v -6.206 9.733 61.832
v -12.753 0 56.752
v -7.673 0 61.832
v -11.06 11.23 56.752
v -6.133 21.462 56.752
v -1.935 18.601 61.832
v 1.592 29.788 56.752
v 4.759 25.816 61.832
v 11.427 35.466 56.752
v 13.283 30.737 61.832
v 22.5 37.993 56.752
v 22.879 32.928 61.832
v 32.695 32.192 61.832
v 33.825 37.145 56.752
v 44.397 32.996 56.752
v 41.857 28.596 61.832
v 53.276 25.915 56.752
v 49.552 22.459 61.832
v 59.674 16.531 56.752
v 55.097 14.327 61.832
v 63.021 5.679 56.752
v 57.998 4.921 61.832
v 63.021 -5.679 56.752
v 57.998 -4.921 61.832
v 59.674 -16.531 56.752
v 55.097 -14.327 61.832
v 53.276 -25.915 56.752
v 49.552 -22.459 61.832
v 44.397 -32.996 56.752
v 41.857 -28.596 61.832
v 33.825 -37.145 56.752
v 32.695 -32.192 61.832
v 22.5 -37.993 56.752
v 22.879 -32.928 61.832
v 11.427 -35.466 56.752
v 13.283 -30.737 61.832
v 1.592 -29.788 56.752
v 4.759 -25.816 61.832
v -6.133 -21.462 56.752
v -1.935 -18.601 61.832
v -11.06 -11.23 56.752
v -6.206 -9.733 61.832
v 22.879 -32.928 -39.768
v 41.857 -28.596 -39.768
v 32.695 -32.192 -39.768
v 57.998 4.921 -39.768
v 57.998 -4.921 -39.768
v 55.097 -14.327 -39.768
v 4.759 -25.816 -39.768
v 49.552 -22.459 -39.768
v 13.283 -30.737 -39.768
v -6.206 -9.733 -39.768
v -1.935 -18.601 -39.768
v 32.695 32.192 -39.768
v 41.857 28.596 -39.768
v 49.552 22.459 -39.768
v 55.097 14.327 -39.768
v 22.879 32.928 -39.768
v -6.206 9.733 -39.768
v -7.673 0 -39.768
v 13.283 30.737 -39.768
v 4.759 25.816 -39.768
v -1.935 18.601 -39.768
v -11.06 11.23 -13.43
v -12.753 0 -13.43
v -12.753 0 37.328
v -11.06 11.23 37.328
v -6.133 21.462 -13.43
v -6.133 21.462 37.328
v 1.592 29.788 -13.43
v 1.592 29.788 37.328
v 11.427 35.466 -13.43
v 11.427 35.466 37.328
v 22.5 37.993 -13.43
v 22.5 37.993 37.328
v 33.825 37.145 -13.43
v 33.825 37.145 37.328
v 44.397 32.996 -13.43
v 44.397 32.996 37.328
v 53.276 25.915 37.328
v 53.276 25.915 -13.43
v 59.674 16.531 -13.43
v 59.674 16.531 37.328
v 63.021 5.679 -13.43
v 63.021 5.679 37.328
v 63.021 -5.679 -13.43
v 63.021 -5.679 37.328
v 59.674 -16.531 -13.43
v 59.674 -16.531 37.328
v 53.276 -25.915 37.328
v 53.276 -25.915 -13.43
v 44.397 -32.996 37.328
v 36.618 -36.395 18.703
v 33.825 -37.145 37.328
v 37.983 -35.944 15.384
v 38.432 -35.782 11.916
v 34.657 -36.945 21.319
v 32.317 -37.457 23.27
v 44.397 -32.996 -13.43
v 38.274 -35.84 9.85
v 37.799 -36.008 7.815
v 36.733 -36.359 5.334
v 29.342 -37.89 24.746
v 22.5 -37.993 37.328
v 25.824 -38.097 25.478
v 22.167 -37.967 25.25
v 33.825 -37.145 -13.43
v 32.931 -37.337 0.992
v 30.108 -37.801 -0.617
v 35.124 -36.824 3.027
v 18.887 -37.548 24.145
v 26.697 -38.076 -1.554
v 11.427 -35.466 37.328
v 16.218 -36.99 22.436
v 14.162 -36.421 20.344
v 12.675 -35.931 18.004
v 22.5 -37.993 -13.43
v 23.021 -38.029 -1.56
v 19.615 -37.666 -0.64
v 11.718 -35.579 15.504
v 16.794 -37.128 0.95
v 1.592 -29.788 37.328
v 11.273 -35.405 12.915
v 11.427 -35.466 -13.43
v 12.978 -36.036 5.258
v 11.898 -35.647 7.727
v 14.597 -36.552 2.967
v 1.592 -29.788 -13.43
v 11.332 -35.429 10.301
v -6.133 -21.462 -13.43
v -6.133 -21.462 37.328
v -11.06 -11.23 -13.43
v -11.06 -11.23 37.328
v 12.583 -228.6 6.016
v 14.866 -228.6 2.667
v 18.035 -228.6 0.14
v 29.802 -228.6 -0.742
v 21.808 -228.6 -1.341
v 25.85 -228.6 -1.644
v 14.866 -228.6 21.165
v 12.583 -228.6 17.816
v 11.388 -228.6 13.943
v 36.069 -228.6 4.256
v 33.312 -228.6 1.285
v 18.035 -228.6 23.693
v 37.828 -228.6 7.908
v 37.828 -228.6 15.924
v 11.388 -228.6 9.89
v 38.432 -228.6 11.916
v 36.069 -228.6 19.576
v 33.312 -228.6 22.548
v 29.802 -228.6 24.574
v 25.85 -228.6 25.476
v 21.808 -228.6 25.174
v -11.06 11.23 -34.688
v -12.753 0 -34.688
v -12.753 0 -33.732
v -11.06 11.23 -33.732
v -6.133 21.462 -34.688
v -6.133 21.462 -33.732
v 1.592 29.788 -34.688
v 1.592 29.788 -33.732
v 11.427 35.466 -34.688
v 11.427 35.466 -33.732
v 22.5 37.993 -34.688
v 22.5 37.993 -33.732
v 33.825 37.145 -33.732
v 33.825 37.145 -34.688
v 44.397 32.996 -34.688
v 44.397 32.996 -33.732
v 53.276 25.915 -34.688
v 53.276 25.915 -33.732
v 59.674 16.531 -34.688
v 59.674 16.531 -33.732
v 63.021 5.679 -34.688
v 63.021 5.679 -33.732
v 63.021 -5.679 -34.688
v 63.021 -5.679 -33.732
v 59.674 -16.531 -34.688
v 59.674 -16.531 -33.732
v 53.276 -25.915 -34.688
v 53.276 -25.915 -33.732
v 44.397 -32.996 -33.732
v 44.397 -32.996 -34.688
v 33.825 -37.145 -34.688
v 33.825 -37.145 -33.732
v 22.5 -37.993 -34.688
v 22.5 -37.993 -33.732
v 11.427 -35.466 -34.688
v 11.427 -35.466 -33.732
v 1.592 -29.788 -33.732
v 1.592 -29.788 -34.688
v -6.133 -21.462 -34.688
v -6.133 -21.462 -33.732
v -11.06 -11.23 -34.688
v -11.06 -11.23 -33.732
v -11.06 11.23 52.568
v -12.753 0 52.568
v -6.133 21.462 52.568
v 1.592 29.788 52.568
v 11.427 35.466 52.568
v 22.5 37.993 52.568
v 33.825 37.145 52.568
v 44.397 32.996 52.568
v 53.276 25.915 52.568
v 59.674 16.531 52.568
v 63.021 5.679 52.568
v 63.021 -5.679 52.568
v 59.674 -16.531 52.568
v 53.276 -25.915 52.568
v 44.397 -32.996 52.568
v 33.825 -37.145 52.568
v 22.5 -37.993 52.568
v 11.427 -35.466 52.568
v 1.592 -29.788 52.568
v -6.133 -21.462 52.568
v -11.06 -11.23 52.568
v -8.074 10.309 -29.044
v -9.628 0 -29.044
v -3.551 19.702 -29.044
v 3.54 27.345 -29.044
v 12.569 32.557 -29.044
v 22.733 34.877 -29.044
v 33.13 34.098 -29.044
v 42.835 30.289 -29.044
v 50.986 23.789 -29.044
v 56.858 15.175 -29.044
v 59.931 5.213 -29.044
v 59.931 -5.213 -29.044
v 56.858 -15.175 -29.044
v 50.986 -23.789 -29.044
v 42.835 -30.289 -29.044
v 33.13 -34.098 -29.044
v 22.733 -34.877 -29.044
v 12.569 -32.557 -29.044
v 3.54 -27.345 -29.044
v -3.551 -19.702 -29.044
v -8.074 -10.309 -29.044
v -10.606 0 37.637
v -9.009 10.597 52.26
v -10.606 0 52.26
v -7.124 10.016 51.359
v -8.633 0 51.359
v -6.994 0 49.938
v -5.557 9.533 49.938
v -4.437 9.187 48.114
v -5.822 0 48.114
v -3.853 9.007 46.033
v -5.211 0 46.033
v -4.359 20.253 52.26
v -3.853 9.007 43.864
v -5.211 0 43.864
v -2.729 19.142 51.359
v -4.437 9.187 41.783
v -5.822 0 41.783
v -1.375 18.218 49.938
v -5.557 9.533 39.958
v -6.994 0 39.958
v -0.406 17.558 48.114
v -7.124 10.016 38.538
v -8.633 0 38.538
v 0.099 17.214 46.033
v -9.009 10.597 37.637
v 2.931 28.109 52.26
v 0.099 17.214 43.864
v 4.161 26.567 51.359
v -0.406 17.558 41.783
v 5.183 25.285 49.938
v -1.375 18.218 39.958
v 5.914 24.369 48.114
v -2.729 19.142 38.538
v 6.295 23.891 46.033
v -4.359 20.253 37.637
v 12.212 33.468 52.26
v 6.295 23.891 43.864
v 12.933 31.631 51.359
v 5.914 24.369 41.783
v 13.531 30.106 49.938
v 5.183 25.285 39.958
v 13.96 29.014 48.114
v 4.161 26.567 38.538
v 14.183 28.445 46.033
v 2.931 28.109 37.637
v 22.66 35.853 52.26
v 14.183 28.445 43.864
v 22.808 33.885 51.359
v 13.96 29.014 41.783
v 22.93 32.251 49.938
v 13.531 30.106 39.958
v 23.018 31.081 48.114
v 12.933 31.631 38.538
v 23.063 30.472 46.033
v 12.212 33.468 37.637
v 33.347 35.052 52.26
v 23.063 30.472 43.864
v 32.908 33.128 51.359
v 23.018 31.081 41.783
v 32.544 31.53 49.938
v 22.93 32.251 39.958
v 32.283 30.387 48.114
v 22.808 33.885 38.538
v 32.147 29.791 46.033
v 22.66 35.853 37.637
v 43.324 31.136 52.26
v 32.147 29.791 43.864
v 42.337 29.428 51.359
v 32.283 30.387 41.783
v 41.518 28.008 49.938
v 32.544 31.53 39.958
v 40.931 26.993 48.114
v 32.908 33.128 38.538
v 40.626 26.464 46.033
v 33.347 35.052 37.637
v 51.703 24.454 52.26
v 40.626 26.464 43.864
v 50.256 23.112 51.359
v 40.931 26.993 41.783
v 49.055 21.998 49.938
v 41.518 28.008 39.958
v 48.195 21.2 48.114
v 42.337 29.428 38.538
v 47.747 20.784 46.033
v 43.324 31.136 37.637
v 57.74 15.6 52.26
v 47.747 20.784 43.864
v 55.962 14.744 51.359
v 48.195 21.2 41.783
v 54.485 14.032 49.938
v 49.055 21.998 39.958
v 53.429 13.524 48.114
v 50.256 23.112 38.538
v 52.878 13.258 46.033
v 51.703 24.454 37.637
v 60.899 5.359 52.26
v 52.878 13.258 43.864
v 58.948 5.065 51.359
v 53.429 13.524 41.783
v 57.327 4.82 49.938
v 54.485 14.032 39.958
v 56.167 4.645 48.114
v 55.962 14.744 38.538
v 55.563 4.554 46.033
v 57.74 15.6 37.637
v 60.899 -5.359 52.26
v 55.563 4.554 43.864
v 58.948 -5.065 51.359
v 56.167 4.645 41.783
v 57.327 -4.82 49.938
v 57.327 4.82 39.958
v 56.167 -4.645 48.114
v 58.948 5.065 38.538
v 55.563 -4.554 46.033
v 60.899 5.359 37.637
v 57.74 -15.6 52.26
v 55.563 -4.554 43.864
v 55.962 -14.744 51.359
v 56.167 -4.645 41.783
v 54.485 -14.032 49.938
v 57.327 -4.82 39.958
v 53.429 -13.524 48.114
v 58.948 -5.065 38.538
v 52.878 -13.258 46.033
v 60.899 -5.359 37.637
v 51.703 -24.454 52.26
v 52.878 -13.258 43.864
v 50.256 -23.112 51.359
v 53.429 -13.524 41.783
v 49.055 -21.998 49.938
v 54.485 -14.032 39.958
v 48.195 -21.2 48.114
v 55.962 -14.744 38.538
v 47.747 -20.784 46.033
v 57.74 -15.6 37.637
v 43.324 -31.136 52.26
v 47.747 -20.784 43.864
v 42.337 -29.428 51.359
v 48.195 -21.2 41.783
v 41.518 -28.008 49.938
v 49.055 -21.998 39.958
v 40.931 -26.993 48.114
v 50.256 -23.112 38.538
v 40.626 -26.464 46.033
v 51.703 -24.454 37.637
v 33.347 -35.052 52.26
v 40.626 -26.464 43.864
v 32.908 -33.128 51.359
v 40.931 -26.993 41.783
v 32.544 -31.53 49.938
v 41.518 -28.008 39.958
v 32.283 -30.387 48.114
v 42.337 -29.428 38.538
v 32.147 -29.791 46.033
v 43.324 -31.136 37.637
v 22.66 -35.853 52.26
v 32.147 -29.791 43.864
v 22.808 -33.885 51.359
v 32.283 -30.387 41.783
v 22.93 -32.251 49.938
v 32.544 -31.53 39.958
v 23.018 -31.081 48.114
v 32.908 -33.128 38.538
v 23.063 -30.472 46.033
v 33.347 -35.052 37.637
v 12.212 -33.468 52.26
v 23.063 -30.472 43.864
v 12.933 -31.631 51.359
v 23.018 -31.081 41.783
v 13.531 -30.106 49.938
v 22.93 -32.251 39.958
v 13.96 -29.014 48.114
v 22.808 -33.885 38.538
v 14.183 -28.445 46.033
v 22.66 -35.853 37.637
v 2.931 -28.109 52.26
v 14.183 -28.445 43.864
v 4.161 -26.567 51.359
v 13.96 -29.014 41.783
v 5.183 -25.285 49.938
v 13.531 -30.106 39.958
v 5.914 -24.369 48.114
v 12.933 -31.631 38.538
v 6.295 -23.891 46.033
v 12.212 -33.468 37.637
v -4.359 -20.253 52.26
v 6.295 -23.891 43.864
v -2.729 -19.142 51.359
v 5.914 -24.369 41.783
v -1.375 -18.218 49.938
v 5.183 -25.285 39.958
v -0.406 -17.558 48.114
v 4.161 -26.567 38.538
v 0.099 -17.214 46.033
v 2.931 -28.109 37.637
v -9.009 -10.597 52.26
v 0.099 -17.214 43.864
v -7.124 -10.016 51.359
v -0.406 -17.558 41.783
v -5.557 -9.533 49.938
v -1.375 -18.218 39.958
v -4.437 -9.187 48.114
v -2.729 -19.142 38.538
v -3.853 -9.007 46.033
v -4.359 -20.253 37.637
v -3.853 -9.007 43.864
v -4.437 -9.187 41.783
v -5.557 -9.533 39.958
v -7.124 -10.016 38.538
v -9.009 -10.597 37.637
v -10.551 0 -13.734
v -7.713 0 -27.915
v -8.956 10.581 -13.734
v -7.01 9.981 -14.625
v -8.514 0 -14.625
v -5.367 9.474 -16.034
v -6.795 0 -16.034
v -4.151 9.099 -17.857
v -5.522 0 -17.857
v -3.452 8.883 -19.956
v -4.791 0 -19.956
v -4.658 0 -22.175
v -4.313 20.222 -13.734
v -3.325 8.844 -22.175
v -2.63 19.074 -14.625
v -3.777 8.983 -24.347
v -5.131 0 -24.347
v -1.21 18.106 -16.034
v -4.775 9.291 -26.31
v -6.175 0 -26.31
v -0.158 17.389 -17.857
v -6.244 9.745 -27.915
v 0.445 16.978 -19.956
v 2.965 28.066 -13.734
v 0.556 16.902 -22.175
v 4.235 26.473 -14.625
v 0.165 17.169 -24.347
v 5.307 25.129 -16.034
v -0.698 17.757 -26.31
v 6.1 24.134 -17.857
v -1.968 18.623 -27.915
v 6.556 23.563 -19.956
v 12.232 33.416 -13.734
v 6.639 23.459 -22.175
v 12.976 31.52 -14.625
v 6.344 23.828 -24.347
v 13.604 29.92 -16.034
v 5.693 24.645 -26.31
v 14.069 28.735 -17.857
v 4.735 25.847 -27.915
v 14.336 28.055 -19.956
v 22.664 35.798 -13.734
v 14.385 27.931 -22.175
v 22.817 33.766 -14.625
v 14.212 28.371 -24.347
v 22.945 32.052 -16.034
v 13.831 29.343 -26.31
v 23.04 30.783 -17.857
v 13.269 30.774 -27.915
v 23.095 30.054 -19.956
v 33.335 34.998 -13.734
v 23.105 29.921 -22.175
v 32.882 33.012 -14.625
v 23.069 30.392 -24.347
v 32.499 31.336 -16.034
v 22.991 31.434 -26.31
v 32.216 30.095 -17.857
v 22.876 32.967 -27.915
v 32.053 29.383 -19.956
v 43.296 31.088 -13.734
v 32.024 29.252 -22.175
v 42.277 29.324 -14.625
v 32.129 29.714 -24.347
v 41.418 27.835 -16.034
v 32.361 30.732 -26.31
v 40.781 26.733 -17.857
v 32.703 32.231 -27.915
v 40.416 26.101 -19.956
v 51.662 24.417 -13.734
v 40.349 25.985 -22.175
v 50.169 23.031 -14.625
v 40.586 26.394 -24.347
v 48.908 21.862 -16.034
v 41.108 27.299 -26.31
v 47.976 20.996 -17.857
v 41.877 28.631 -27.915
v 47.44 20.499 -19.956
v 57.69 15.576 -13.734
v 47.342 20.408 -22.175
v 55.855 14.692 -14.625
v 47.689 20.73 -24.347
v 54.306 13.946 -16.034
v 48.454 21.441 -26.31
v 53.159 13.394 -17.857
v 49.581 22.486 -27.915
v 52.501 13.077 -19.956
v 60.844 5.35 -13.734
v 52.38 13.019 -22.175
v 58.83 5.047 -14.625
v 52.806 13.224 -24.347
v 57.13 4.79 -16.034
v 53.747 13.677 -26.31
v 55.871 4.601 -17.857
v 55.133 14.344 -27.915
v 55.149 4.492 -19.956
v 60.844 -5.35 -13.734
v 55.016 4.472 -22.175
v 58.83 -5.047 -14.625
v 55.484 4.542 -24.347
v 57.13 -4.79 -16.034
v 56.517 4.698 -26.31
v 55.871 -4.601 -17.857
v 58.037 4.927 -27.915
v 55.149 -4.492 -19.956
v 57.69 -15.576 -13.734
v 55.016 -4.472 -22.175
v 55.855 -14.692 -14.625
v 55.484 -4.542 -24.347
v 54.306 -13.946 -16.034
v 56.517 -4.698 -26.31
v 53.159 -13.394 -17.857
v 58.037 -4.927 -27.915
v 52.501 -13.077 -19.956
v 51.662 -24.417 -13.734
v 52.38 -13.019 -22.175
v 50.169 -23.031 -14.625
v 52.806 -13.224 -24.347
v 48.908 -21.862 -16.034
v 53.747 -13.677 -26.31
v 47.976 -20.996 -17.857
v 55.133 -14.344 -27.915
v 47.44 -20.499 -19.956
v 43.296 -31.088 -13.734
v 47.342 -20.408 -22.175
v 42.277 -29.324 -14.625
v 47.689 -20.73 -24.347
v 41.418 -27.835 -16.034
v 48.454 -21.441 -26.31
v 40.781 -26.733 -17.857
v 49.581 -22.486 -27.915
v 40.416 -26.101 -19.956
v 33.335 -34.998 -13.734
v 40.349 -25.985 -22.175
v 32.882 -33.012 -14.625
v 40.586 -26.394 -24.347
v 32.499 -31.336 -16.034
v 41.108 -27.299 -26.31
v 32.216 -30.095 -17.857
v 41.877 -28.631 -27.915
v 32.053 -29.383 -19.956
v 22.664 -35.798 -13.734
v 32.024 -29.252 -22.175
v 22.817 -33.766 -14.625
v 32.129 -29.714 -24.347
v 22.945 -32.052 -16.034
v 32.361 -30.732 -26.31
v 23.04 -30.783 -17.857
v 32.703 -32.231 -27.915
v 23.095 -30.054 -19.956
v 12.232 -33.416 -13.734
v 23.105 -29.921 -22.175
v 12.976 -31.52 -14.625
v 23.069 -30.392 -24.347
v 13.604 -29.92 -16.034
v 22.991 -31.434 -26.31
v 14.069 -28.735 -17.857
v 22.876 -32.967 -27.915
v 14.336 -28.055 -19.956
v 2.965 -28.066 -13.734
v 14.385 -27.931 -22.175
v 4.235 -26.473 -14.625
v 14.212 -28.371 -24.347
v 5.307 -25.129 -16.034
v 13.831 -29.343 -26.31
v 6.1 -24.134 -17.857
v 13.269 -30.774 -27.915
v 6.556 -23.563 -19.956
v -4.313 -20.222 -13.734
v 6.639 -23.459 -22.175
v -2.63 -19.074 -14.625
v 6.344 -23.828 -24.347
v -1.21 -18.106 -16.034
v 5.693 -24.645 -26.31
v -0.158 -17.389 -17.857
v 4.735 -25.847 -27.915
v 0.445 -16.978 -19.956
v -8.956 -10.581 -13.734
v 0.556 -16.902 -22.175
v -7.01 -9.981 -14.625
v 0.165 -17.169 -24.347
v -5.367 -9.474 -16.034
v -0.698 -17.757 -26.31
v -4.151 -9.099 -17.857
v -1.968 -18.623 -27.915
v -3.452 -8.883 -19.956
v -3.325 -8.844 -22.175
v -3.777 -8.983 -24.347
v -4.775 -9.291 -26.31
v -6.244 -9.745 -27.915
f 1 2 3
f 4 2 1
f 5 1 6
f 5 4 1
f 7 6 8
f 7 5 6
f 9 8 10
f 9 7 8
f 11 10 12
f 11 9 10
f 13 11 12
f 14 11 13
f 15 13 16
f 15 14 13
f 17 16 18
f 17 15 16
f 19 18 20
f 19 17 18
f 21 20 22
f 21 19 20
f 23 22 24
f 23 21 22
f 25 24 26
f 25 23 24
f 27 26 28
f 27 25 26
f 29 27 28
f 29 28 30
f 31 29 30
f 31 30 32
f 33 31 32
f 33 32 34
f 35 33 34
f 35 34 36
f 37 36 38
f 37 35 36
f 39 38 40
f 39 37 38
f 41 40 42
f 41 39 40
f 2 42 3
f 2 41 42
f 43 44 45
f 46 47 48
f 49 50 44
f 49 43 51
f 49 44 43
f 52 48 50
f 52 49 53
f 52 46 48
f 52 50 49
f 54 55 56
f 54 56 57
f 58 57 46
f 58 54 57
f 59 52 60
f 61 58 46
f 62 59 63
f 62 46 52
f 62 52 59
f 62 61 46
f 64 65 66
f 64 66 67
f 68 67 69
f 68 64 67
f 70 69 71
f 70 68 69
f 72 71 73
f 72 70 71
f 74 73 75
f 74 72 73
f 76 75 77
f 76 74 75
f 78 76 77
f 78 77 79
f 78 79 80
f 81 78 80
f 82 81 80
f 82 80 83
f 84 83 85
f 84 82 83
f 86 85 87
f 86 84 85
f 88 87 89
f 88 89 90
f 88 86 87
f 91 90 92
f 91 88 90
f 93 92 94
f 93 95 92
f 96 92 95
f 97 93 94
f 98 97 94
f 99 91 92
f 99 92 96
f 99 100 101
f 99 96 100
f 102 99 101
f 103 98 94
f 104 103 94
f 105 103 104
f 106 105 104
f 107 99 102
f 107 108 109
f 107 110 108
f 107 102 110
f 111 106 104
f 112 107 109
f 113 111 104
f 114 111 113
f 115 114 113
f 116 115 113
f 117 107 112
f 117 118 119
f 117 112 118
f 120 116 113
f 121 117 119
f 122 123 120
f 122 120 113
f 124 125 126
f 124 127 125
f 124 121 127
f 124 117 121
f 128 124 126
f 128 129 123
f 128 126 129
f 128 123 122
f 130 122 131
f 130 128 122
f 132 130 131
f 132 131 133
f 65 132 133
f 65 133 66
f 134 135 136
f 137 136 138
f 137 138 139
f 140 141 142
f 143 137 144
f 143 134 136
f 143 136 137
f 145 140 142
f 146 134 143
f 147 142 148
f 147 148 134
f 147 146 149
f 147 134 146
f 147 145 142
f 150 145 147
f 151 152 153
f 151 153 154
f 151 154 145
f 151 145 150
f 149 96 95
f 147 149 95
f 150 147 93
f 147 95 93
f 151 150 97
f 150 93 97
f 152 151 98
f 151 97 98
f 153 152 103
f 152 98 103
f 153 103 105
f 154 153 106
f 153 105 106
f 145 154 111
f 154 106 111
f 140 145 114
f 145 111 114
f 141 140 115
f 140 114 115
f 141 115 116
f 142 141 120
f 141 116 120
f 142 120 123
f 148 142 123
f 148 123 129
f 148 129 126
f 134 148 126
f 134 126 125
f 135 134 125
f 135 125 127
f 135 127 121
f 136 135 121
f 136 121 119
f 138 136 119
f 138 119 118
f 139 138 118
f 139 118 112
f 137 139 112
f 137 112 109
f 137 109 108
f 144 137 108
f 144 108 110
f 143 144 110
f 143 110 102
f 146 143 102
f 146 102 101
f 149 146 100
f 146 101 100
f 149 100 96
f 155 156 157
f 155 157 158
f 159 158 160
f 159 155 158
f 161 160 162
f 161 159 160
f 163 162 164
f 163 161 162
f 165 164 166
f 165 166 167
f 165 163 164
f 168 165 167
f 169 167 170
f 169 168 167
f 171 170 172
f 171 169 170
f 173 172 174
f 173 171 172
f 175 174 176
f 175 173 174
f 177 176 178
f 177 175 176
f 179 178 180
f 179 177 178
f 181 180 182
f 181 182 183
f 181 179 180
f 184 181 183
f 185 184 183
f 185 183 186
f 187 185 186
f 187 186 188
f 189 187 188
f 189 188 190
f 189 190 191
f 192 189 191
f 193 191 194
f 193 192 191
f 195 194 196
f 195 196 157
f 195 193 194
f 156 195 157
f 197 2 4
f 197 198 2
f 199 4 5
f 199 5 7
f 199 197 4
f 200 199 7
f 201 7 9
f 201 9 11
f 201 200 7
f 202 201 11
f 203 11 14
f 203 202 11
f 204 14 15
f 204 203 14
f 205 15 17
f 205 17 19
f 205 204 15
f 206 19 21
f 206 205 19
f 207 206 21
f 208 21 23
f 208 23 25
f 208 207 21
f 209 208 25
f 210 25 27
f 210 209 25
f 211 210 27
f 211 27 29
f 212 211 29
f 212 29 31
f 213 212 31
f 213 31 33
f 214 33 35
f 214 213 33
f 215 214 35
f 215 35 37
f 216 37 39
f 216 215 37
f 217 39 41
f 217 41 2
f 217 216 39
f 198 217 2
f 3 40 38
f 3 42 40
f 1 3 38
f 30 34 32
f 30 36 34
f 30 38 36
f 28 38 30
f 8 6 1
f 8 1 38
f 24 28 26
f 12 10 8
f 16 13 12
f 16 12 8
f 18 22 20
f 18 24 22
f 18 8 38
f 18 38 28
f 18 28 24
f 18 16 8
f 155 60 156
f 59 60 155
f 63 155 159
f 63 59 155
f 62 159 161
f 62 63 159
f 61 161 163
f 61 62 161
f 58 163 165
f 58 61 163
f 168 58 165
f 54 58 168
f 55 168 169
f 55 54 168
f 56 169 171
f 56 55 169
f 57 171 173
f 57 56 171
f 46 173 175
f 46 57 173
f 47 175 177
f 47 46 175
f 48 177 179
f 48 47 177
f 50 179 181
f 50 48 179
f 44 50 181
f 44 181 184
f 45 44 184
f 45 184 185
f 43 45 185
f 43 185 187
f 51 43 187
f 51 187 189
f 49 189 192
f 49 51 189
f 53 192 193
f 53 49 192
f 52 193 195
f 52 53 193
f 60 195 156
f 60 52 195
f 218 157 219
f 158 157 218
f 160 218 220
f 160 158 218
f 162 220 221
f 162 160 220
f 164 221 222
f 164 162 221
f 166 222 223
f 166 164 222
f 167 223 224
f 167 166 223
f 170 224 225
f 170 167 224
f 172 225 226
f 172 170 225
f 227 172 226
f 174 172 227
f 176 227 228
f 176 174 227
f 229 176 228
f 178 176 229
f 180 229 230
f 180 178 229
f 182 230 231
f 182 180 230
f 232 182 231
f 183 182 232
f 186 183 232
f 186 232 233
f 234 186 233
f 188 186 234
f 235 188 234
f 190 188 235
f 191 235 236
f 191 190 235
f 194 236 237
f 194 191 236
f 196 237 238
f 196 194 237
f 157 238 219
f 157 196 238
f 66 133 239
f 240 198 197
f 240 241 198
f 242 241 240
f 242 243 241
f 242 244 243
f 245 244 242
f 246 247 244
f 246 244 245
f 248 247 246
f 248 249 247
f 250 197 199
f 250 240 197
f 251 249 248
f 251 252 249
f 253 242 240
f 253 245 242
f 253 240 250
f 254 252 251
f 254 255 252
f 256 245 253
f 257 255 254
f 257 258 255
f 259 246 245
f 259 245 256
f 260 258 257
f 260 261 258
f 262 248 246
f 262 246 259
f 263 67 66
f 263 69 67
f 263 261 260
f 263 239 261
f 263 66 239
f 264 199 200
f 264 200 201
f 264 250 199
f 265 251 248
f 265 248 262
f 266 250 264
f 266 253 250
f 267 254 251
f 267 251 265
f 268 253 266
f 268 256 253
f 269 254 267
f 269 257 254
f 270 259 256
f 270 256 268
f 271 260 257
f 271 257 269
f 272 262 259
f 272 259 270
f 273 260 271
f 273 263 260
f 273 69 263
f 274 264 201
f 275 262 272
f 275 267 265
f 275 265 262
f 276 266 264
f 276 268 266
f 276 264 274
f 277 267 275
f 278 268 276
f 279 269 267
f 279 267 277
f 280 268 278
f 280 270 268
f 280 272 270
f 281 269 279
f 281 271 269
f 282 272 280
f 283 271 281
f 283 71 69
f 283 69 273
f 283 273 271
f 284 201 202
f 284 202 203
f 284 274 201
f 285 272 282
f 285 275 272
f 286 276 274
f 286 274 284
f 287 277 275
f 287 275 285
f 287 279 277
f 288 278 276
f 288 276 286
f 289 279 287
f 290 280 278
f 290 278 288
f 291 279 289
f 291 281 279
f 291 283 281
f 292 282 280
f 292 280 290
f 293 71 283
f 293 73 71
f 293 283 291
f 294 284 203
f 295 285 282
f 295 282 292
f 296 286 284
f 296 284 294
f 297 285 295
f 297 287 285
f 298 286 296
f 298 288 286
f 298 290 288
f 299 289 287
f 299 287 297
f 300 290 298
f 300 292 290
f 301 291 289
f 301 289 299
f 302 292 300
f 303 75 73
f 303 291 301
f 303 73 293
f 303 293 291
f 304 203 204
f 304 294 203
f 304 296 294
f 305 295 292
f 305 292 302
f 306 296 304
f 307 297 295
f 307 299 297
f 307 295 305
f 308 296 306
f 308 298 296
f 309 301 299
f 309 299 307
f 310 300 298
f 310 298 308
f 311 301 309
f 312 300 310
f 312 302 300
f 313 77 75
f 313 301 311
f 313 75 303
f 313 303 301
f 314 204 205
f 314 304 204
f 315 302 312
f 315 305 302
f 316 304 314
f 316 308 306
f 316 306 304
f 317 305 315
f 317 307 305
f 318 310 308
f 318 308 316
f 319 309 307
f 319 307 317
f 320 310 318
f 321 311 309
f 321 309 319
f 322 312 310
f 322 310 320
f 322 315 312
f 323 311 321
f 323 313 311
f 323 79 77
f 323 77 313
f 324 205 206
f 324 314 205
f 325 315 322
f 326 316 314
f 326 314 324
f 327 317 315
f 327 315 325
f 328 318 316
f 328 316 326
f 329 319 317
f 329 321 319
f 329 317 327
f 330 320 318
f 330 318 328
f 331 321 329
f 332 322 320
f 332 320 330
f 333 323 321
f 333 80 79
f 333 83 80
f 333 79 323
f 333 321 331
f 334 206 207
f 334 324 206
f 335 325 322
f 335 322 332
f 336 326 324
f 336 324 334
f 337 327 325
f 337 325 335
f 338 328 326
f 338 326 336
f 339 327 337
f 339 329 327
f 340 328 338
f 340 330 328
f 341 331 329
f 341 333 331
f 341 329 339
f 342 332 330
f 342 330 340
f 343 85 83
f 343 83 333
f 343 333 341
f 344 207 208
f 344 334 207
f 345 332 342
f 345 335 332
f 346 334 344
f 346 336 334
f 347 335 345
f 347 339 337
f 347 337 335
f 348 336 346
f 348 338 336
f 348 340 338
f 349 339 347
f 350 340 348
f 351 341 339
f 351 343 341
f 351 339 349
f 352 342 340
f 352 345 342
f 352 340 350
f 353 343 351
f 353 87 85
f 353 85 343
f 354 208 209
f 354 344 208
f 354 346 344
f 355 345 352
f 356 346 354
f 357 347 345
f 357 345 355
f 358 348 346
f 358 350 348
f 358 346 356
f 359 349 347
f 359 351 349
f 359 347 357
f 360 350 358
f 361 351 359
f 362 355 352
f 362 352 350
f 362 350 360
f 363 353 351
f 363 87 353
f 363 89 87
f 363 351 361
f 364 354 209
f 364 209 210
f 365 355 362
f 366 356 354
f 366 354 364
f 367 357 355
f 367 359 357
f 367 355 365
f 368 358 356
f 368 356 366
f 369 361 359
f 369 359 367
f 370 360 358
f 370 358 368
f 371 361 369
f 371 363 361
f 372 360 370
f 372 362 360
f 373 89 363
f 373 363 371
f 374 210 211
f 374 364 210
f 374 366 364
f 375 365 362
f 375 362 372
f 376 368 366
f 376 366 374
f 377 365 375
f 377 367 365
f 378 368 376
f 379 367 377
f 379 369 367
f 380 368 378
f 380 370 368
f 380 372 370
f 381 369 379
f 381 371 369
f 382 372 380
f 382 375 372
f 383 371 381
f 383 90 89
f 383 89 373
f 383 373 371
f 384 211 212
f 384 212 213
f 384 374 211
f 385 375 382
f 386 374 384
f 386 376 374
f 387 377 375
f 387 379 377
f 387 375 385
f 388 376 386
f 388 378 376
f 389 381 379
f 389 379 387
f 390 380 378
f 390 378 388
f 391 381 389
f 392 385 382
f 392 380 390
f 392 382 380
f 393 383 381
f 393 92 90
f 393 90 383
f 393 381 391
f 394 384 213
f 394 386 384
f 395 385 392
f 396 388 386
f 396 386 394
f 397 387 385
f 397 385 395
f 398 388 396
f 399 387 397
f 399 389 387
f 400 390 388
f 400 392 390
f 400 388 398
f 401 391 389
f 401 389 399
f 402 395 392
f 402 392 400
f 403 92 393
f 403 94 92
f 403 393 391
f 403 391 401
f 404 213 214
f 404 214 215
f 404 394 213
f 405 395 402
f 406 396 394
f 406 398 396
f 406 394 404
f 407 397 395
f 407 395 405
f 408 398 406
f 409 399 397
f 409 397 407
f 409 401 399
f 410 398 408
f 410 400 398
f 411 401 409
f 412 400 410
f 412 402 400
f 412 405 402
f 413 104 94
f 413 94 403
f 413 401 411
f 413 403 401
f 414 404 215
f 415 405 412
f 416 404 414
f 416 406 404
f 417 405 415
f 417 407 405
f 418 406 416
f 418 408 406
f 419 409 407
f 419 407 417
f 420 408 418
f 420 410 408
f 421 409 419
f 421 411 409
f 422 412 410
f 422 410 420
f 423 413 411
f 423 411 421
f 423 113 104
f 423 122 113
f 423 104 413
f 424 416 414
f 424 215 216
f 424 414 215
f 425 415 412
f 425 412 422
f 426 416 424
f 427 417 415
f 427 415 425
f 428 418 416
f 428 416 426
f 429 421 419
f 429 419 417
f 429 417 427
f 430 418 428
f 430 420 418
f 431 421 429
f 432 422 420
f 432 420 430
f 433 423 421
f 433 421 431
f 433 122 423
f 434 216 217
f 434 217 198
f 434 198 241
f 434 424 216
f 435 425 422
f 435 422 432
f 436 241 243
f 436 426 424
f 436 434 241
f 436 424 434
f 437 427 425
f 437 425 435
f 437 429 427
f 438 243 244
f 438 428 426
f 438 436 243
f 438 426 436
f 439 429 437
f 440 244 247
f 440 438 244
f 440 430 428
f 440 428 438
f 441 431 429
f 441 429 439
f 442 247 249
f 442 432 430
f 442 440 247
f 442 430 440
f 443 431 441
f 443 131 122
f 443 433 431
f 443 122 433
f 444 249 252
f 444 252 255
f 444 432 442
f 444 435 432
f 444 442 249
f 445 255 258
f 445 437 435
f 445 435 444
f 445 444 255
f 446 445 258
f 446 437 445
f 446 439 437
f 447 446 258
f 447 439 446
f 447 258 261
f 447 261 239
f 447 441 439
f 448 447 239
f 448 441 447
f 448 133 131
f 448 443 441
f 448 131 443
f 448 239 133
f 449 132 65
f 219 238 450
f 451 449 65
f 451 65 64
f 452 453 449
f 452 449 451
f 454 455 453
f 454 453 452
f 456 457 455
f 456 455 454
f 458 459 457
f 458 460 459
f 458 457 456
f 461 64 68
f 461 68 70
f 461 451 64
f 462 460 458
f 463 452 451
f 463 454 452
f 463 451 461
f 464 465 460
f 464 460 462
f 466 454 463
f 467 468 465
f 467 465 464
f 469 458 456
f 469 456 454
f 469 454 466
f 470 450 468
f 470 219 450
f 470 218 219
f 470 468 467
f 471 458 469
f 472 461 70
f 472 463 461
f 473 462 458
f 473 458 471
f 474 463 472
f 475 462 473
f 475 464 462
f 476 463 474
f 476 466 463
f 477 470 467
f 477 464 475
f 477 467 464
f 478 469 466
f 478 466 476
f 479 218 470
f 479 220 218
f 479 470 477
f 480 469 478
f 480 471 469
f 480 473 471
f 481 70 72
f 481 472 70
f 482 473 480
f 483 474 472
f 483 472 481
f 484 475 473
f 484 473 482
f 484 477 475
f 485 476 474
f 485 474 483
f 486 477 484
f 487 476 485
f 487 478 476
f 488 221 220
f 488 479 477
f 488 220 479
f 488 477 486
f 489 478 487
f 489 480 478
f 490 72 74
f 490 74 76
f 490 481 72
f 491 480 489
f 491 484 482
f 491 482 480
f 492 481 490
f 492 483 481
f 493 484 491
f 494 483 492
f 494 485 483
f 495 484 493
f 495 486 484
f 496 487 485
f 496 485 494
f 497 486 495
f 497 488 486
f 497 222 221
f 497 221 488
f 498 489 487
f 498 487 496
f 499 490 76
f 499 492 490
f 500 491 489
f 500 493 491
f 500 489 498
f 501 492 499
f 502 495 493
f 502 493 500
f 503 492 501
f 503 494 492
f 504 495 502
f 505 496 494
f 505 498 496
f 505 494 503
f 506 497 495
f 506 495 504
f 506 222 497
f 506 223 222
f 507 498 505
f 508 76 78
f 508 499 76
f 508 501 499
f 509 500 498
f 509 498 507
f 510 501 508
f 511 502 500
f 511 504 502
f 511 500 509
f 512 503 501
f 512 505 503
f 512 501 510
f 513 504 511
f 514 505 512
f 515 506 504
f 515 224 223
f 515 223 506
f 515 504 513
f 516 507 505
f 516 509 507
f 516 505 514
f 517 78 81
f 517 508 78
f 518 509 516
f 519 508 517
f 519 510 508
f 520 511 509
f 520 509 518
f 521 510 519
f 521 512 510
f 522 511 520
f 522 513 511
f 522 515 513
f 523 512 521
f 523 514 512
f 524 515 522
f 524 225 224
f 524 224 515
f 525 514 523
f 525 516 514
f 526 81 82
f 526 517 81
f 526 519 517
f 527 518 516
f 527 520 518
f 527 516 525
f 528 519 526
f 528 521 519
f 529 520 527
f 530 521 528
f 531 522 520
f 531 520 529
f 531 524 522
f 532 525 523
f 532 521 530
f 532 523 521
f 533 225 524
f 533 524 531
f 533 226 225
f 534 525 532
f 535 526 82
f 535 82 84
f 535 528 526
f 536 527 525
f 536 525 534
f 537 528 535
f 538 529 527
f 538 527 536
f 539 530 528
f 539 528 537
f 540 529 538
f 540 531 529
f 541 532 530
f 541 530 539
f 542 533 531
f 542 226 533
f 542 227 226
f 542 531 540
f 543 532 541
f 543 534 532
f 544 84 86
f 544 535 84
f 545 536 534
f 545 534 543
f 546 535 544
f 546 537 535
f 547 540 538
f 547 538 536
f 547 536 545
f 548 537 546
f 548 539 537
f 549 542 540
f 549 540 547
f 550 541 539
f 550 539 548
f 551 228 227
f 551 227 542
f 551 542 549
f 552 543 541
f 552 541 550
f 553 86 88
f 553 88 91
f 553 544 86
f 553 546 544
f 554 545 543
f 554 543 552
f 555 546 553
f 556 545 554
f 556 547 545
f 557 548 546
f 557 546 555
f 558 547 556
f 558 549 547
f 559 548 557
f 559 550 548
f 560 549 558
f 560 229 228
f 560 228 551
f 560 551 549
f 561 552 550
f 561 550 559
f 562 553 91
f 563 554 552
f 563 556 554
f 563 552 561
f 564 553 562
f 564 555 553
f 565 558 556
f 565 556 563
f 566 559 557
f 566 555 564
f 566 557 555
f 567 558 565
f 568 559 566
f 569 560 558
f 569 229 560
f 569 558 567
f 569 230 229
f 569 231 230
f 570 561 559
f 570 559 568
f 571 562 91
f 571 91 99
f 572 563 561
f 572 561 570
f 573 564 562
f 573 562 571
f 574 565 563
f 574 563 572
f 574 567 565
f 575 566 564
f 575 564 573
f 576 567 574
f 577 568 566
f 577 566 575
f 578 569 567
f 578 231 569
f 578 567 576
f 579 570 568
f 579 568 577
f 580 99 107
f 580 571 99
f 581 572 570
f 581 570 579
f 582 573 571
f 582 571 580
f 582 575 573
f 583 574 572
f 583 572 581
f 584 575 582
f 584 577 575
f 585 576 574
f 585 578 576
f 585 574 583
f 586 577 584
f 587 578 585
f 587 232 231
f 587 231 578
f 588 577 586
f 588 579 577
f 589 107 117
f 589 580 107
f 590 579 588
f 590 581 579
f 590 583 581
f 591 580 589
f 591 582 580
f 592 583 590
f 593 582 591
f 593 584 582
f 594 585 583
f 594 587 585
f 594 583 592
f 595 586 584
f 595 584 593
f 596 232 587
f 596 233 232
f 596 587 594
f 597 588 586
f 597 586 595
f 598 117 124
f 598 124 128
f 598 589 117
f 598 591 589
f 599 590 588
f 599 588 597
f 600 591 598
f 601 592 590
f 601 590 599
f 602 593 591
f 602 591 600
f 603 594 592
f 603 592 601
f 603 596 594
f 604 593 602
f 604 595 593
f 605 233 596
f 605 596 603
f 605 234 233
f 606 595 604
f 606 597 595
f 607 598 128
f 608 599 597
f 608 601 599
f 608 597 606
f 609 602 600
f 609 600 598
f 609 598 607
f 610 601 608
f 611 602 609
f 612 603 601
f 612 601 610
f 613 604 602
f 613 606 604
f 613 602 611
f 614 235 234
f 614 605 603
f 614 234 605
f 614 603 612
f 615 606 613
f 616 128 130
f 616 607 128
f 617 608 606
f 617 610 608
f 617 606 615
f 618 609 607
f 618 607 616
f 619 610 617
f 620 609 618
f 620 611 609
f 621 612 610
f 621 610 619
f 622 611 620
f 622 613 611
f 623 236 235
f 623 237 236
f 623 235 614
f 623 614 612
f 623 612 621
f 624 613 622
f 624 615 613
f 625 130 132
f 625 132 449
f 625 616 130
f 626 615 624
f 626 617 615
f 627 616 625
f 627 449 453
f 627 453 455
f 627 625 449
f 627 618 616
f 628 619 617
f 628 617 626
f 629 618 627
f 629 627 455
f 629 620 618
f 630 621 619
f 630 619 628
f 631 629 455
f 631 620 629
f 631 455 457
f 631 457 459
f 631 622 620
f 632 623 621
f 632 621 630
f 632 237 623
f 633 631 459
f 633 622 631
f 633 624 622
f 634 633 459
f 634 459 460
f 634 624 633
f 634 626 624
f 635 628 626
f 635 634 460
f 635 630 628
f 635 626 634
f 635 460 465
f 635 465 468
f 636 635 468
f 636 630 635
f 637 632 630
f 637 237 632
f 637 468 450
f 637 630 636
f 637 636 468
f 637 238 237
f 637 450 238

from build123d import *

# Parameters (mm, degrees)
F2_R     = 13.5980918735
F3_DEPTH = 228.6


# Not quite as in the source:
# - a fillet or chamfer that OpenCascade refuses, or shapes differently, is made with other operations: its cross-section is extruded or revolved along the edge and cut away or added


with BuildPart() as f1:
    # F0 (on Front) → F1 (revolve)
    with BuildSketch(Plane.XZ):
        with BuildLine():
            Line((25.3469641268, 61.8318257093), (-12.7530358732, 61.8318257093))
            Line((-12.7530358732, 61.8318257093), (-12.7530358732, 52.5684214187))
            ThreePointArc((-12.7530358732, 52.5684214187), (-5.1330358732, 44.9484214187), (-12.7530358732, 37.3284214187))
            Line((-12.7530358732, 37.3284214187), (-12.7530358732, -13.4300431368))
            ThreePointArc((-12.7530358732, -13.4300431368), (-4.6335244682, -21.5495545417), (-12.7530358732, -29.6690659466))
            Line((-12.7530358732, -29.6690659466), (-12.7530358732, -39.7681742907))
            Line((-12.7530358732, -39.7681742907), (25.3469641268, -39.7681742907))
            Line((25.3469641268, -39.7681742907), (25.3469641268, 61.8318257093))
        make_face()
    revolve(axis=Axis((25.3469641268, 0, 11.0318257093), (0, 0, -1)))

    # F2 (on Front) → F3 (join)
    with BuildSketch(Plane.XZ):
        with Locations((24.8341448605, 11.9163831696)):
            Circle(F2_R)
    extrude(amount=F3_DEPTH)

    # F4: chamfer of 5.08 on 4 edges, made by hand

    # F4_s1 → F4_t2 (revolve, cut)
    with BuildSketch(Plane.XZ):
        Polygon((-7.6730358732, 61.8318257093), (-12.7530358732, 56.7518257093), (-12.7530358732, 61.8318257093), align=None)
    revolve(axis=Axis((25.3469641268, 0, 61.8318257093), (0, 0, -1)), mode=Mode.SUBTRACT)

    # F4_s3 → F4_t4 (revolve, cut)
    with BuildSketch(Plane.XZ):
        with BuildLine():
            Line((-9.6281385439, -29.0436510274), (-12.7530358732, -33.7323580503))
            Line((-12.7530358732, -33.7323580503), (-12.7530358732, -29.6690659466))
            ThreePointArc((-12.7530358732, -29.6690659466), (-11.0871747515, -29.4963383048), (-9.6281385439, -29.0436510274))
        make_face()
    revolve(axis=Axis((25.3469641268, 0, -29.6690659466), (0, 0, -1)), mode=Mode.SUBTRACT)

    # F4_s5 → F4_t6 (revolve, cut)
    with BuildSketch(Plane.XZ):
        Polygon((-12.7530358732, -34.6881742907), (-7.6730358732, -39.7681742907), (-12.7530358732, -39.7681742907), align=None)
    revolve(axis=Axis((25.3469641268, 0, -39.7681742907), (0, 0, -1)), mode=Mode.SUBTRACT)


solid = f1.part
